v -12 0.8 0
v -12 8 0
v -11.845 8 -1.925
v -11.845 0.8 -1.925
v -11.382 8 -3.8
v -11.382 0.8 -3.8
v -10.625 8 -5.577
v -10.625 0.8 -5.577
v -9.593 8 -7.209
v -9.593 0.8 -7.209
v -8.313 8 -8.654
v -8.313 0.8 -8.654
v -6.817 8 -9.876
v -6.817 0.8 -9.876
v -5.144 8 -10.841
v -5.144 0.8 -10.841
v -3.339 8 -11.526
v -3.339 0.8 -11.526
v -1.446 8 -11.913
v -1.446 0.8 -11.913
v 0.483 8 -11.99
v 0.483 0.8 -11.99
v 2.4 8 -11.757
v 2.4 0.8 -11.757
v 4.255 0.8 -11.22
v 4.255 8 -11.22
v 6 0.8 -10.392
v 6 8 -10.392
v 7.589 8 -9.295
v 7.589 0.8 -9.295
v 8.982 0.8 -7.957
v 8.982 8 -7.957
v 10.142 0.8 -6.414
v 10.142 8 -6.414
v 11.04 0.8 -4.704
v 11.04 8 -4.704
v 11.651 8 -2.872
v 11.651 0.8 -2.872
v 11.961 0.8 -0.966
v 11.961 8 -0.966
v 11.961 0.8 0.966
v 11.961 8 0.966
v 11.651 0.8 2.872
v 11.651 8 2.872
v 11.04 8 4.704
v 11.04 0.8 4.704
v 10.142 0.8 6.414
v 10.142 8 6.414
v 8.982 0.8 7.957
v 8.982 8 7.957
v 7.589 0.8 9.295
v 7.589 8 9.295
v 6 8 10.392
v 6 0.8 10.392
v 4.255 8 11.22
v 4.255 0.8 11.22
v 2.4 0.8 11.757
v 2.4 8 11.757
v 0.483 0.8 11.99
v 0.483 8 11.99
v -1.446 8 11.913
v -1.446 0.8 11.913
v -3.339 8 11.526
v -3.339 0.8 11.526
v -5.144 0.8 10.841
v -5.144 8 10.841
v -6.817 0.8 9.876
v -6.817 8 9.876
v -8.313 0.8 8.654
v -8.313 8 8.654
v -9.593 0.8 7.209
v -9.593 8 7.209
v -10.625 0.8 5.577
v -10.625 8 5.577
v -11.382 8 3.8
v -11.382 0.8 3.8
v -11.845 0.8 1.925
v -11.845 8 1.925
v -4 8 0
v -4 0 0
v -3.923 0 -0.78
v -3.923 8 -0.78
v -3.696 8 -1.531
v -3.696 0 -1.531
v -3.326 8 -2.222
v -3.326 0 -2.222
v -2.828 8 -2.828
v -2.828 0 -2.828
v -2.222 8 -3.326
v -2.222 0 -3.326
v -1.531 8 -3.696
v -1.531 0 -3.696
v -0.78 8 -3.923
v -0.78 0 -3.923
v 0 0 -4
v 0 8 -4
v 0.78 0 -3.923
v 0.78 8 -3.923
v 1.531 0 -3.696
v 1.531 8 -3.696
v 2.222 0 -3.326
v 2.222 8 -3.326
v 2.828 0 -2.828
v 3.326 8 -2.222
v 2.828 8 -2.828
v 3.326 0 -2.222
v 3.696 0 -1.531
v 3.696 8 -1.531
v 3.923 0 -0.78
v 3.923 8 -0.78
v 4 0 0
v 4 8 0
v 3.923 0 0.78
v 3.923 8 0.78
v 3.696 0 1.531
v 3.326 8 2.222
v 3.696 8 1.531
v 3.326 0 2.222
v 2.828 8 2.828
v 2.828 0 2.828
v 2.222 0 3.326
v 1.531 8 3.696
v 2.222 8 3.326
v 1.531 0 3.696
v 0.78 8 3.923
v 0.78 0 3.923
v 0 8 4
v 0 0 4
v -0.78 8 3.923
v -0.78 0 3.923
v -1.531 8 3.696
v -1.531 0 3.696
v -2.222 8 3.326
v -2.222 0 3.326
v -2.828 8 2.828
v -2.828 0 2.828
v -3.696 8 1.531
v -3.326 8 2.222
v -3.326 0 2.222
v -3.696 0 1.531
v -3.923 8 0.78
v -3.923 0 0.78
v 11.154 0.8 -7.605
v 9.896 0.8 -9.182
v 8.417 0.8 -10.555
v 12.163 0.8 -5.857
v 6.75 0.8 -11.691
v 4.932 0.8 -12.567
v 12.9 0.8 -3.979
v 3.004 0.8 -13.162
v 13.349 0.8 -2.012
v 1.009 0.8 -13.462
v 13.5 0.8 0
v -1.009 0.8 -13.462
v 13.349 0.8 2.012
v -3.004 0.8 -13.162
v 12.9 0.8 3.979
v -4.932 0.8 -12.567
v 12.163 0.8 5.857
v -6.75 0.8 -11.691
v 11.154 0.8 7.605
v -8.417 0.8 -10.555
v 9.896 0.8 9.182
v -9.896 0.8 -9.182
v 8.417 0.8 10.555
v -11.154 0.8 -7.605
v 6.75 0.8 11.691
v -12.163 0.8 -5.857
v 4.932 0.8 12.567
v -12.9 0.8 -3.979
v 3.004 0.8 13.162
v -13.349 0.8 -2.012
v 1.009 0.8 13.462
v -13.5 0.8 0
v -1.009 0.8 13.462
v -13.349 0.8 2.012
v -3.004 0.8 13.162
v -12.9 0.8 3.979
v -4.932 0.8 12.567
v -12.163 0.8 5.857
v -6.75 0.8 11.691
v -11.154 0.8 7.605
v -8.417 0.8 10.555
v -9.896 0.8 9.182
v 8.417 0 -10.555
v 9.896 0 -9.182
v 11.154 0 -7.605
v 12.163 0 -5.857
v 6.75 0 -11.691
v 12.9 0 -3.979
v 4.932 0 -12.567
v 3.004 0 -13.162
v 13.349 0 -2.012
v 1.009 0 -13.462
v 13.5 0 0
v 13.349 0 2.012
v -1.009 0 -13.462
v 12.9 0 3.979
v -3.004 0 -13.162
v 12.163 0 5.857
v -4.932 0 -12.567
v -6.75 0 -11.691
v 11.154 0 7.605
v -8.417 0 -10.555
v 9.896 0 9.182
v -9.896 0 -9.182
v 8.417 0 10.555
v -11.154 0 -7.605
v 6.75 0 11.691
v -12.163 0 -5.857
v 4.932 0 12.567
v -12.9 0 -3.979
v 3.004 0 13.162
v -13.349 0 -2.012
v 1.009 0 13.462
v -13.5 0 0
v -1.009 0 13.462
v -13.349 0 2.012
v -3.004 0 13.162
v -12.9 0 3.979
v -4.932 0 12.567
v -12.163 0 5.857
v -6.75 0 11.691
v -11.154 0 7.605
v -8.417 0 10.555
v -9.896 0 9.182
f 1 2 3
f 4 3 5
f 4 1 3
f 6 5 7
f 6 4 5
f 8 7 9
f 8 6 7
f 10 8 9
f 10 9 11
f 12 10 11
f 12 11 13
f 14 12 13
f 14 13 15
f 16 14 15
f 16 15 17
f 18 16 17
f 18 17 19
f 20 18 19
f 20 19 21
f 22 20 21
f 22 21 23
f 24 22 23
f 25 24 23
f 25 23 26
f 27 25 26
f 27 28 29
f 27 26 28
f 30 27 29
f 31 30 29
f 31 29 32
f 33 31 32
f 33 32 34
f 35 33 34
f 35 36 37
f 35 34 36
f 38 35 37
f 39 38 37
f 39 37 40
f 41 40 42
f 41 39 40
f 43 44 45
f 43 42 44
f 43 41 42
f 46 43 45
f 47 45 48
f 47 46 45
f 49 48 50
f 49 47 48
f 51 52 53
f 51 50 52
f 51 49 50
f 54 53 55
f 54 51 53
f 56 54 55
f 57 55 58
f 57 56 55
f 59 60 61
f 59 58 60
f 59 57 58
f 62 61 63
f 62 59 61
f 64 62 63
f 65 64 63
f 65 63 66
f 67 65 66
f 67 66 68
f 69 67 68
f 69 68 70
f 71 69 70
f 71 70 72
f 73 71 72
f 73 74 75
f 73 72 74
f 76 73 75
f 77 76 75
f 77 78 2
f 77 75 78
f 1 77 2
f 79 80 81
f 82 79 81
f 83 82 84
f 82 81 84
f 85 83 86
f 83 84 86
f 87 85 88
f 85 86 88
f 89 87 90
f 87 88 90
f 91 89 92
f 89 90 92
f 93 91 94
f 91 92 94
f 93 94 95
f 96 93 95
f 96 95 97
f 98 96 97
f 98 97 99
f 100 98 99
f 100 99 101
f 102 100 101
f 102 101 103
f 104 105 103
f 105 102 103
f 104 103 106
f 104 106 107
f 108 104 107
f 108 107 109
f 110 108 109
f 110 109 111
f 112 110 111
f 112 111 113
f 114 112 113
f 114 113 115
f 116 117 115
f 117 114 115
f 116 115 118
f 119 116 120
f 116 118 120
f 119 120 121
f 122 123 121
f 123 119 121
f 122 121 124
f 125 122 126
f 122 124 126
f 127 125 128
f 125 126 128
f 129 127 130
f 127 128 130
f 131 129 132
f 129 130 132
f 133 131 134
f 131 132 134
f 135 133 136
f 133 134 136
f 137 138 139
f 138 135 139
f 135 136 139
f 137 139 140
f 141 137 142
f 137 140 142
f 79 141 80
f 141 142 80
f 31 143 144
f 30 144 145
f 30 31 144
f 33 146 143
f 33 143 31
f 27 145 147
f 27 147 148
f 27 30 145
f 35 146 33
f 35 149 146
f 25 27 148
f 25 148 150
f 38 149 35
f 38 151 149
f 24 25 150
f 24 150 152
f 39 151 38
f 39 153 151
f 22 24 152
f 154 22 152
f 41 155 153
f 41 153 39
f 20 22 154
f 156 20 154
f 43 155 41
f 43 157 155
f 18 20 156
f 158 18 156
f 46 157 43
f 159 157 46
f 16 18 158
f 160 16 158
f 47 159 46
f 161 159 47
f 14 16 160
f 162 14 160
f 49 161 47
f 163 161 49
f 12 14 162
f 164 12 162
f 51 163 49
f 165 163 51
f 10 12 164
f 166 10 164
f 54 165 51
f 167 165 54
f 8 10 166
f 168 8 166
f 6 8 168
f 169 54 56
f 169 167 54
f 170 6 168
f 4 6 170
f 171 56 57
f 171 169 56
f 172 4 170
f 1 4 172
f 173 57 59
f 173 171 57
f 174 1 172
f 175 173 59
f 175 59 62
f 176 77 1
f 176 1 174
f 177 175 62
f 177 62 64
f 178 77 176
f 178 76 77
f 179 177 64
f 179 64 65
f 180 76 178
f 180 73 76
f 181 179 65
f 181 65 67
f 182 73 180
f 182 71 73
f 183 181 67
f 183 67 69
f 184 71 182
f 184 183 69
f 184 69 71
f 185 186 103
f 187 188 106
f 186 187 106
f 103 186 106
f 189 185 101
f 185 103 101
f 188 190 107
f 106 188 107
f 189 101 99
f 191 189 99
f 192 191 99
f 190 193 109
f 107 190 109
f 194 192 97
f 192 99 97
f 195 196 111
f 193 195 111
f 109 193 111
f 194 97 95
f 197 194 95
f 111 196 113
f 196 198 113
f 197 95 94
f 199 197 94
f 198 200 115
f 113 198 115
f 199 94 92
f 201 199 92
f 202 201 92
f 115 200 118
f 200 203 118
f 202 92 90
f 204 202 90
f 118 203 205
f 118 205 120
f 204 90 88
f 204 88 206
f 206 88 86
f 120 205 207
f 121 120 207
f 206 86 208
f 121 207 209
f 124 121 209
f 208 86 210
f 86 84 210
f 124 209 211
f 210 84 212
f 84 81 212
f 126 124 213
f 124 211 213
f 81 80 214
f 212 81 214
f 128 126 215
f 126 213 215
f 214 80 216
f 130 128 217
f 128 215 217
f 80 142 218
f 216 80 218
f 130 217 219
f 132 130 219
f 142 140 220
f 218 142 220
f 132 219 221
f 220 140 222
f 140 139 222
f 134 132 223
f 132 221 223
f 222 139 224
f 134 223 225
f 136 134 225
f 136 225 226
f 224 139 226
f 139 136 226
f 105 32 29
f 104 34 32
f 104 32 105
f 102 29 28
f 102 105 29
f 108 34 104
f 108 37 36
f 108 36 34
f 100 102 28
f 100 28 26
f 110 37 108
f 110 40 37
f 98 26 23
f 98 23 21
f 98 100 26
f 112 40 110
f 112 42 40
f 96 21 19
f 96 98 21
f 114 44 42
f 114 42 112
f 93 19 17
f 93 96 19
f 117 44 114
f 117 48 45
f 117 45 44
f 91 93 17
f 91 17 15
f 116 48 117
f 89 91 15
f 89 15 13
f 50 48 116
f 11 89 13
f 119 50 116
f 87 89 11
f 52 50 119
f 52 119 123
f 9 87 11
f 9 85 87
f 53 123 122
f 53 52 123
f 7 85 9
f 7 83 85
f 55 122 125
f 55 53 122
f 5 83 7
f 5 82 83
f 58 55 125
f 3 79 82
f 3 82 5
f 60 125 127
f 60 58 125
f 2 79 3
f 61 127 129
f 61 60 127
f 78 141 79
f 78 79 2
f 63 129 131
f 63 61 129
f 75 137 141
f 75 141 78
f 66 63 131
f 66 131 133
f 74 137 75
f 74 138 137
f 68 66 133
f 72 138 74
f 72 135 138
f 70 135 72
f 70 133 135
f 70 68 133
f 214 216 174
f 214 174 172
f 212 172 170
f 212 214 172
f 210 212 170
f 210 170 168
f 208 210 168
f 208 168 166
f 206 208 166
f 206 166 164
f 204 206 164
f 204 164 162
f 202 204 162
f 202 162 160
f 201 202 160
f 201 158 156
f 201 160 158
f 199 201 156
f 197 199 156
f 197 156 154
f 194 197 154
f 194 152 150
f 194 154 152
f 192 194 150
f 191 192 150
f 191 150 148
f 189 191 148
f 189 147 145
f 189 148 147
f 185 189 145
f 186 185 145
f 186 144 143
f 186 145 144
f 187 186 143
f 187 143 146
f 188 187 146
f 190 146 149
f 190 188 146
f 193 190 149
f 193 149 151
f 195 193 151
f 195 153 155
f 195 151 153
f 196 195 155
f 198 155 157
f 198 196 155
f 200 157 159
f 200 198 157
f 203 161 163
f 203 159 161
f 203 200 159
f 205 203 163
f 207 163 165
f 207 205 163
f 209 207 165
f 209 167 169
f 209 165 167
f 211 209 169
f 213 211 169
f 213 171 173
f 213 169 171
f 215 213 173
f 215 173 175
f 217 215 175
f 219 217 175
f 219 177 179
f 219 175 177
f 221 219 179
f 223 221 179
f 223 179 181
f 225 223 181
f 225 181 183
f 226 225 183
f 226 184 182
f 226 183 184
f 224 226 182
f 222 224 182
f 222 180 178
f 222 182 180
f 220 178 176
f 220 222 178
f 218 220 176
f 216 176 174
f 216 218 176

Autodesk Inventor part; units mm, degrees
ref_plane "YZ Plane" through (0, 0, 0) normal (1, 0, 0) x (0, 1, 0)
ref_plane "XZ Plane" through (0, 0, 0) normal (0, 1, 0) x (-1, 0, 0)
ref_plane "XY Plane" through (0, 0, 0) normal (0, 0, 1) x (1, 0, 0)
sketch "Sketch1" plane through (0, 0, 0) normal (0, 1, 0) x (-1, 0, 0)
  circle A0 centre (0, 0) radius 13.5
  circle A1 centre (0, 0) radius 12
  circle A2 centre (0, 0) radius 4
  dimension "d0" = 27
  dimension "d1" = 24
  dimension "d2" = 8
extrude "Extrusion1" add sketch "Sketch1" along normal blind 8 contours A1
extrude "Extrusion2" add sketch "Sketch1" along normal blind 0.8 contours A0 | A1 | A2
extrude "Extrusion3" cut sketch "Sketch1" along normal blind 0.8 contours A2
properties part number "FlangedBearing"
